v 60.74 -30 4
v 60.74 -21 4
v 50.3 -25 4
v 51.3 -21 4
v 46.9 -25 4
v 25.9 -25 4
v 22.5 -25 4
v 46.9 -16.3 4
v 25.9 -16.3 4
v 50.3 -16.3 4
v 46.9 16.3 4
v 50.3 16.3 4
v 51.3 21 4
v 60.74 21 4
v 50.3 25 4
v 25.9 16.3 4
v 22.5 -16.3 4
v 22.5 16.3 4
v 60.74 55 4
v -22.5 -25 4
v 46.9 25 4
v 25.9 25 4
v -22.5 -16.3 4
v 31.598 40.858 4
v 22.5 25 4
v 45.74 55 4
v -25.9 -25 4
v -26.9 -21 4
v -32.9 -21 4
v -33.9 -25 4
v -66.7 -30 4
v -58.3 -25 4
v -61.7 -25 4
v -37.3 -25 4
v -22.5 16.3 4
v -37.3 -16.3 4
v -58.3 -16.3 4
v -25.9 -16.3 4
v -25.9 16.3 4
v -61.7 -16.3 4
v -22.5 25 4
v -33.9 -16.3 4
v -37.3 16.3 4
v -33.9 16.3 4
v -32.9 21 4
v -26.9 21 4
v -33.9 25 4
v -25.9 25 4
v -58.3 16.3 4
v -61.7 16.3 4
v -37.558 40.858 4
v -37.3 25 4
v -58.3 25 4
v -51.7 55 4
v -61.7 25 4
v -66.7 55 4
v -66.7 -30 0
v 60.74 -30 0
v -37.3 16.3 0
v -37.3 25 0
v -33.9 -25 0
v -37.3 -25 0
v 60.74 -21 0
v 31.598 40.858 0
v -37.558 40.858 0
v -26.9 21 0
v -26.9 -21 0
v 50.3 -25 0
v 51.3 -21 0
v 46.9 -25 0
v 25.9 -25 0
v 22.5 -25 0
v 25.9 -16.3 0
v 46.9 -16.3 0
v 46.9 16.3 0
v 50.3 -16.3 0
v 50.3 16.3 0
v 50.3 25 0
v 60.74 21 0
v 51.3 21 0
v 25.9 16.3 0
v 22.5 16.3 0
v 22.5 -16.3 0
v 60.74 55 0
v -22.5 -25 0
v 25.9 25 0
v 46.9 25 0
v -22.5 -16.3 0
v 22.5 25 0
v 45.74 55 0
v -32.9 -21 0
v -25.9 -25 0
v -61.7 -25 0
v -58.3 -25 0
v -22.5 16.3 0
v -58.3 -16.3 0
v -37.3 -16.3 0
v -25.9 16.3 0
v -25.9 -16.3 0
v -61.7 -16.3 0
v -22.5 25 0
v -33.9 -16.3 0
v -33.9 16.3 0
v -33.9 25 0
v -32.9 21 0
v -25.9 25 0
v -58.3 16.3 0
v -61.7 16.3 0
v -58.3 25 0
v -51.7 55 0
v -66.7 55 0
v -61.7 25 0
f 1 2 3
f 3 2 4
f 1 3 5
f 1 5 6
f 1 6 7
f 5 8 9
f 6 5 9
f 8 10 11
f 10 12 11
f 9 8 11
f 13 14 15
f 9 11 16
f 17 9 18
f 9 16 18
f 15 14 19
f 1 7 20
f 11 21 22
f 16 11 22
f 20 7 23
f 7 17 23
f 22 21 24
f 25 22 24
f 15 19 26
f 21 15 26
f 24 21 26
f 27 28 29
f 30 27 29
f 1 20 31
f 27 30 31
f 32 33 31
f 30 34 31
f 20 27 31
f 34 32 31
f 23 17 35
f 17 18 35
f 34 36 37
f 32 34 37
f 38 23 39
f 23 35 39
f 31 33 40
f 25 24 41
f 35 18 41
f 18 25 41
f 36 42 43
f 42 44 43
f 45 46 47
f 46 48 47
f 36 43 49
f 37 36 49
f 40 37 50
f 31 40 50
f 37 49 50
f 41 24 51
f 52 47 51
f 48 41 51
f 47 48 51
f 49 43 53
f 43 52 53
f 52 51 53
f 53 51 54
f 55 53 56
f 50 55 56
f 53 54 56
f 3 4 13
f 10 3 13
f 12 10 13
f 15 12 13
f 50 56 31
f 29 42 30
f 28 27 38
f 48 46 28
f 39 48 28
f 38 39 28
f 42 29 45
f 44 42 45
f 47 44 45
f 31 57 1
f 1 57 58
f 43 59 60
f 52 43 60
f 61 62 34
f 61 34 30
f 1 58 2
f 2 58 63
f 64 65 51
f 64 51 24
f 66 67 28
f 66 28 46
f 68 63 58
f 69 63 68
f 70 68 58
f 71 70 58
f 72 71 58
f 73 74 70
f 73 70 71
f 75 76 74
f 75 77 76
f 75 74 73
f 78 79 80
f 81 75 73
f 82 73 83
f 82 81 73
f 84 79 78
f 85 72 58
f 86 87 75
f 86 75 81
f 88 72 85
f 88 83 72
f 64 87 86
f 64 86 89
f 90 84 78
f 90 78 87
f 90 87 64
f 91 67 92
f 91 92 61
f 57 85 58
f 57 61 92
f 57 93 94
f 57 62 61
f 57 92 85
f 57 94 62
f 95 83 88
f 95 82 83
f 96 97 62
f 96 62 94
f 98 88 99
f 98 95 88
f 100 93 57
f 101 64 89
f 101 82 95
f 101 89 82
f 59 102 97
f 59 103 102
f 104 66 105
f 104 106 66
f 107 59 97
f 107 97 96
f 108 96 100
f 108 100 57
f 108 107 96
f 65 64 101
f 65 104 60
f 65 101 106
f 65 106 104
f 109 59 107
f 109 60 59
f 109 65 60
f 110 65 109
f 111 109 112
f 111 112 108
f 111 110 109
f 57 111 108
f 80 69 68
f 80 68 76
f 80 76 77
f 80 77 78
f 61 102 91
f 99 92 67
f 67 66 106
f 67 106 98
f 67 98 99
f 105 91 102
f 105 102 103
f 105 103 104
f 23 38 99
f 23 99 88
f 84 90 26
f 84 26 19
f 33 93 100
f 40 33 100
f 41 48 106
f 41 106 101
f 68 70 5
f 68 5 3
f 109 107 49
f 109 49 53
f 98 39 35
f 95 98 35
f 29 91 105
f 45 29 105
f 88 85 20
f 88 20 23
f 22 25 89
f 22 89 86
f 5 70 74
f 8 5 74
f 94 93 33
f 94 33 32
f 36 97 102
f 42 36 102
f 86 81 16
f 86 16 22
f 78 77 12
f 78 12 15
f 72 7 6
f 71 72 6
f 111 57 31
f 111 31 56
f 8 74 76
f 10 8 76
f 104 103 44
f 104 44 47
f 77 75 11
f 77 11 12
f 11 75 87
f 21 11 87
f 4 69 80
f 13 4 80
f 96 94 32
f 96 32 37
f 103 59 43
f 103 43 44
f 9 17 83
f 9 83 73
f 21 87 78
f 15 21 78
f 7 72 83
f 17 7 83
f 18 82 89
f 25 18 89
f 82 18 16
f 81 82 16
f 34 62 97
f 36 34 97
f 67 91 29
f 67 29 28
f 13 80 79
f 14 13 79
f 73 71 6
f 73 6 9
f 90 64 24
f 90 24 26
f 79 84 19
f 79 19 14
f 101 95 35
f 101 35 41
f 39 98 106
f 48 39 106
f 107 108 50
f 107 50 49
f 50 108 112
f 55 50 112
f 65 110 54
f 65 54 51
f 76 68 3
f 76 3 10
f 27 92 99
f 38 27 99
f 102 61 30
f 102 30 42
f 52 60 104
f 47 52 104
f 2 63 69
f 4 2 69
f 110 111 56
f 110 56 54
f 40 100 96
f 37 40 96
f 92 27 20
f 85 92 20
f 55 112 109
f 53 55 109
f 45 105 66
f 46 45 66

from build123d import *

# Parameters (mm, degrees)
SKETCH1_W           = 3.4
SKETCH1_H           = 8.7
SKETCH1_W_2         = 6
SKETCH1_H_2         = 42
BOSS_EXTRUDE1_DEPTH = 4
BOSS_EXTRUDE2_DEPTH = 4


with BuildPart() as part:
    # Sketch1 → Boss-Extrude1 (new body)
    with BuildSketch(Plane.XY):
        Polygon((-66.7, 30), (-66.7, -30), (55.3, -30), (60.740194605, -30), (60.740194605, -21), (58.8, -21), (51.3, -21), (51.3, 21), (58.8, 21), (60.740194605, 21), (60.740194605, 30), (55.3, 30), align=None)
        with Locations((-35.6, 20.65)):
            Rectangle(SKETCH1_W, SKETCH1_H, mode=Mode.SUBTRACT)
        with Locations((24.2, 20.65)):
            Rectangle(SKETCH1_W, SKETCH1_H, mode=Mode.SUBTRACT)
        with Locations((24.2, -20.65)):
            Rectangle(SKETCH1_W, SKETCH1_H, mode=Mode.SUBTRACT)
        with Locations((-24.2, 20.65)):
            Rectangle(SKETCH1_W, SKETCH1_H, mode=Mode.SUBTRACT)
        with Locations((-24.2, -20.65)):
            Rectangle(SKETCH1_W, SKETCH1_H, mode=Mode.SUBTRACT)
        with Locations((48.6, 20.65)):
            Rectangle(SKETCH1_W, SKETCH1_H, mode=Mode.SUBTRACT)
        with Locations((48.6, -20.65)):
            Rectangle(SKETCH1_W, SKETCH1_H, mode=Mode.SUBTRACT)
        with Locations((-35.6, -20.65)):
            Rectangle(SKETCH1_W, SKETCH1_H, mode=Mode.SUBTRACT)
        with Locations((-60, 20.65)):
            Rectangle(SKETCH1_W, SKETCH1_H, mode=Mode.SUBTRACT)
        with Locations((-60, -20.65)):
            Rectangle(SKETCH1_W, SKETCH1_H, mode=Mode.SUBTRACT)
        with Locations((-29.9, 0)):
            Rectangle(SKETCH1_W_2, SKETCH1_H_2, mode=Mode.SUBTRACT)
    extrude(amount=BOSS_EXTRUDE1_DEPTH)

    # Sketch2 → Boss-Extrude2 (add)
    with BuildSketch(Plane.XY):
        Polygon((-66.7, 30), (-66.7, 55), (-51.7, 55), (-37.557864376, 40.857864376), (31.598058981, 40.857864376), (45.740194605, 55), (60.740194605, 55), (60.740194605, 30), align=None)
    extrude(amount=BOSS_EXTRUDE2_DEPTH)


solid = part.part
